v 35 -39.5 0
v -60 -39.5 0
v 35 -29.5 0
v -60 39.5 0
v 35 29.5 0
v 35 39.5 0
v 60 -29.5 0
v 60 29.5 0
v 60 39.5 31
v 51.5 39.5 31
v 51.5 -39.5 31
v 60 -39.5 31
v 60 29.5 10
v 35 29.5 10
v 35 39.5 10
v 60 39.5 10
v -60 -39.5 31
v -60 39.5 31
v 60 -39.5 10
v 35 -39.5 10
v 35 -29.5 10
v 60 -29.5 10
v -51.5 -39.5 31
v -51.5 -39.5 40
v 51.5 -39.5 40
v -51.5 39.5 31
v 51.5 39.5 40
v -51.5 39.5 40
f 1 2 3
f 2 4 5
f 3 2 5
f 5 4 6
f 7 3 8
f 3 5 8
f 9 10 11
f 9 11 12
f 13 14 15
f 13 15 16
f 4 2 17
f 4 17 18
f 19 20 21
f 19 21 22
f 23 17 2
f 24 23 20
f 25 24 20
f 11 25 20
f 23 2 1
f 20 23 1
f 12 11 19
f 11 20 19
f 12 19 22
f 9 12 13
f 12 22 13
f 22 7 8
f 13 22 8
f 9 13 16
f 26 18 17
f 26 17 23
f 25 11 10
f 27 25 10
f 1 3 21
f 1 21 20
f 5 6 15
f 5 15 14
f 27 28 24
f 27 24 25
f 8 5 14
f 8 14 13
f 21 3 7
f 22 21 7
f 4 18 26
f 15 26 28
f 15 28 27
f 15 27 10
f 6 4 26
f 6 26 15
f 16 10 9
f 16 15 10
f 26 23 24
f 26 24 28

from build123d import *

# Parameters (mm, degrees)
SKETCH_W        = 120
SKETCH_H        = 79
PAD_DEPTH       = 31
SKETCH001_W     = 103
SKETCH001_H     = 79
PAD001_DEPTH    = 9
SKETCH003_W     = 25
SKETCH003_H     = 10
POCKET_DEPTH    = 10
SKETCH004_W     = 25
SKETCH004_H     = 10
POCKET001_DEPTH = 10


with BuildPart() as part:
    # Sketch → Pad (new body)
    with BuildSketch(Plane.XY):
        Rectangle(SKETCH_W, SKETCH_H)
    extrude(amount=PAD_DEPTH)

    # Sketch001 → Pad001 (join)
    with BuildSketch(Plane.XY.offset(31)):
        Rectangle(SKETCH001_W, SKETCH001_H)
    extrude(amount=PAD001_DEPTH)

    # Sketch003 (on Face4 of Pad001) → Pocket (cut)
    with BuildSketch(Plane(origin=(0, 0, 0), x_dir=(1, 0, 0), z_dir=(0, 0, -1))):
        with Locations((47.5, -34.5)):
            Rectangle(SKETCH003_W, SKETCH003_H)
    extrude(amount=-POCKET_DEPTH, mode=Mode.SUBTRACT)

    # Sketch004 (on Face2 of Pocket) → Pocket001 (cut)
    with BuildSketch(Plane(origin=(0, 0, 0), x_dir=(1, 0, 0), z_dir=(0, 0, -1))):
        with Locations((47.5, 34.5)):
            Rectangle(SKETCH004_W, SKETCH004_H)
    extrude(amount=-POCKET001_DEPTH, mode=Mode.SUBTRACT)


solid = part.part
